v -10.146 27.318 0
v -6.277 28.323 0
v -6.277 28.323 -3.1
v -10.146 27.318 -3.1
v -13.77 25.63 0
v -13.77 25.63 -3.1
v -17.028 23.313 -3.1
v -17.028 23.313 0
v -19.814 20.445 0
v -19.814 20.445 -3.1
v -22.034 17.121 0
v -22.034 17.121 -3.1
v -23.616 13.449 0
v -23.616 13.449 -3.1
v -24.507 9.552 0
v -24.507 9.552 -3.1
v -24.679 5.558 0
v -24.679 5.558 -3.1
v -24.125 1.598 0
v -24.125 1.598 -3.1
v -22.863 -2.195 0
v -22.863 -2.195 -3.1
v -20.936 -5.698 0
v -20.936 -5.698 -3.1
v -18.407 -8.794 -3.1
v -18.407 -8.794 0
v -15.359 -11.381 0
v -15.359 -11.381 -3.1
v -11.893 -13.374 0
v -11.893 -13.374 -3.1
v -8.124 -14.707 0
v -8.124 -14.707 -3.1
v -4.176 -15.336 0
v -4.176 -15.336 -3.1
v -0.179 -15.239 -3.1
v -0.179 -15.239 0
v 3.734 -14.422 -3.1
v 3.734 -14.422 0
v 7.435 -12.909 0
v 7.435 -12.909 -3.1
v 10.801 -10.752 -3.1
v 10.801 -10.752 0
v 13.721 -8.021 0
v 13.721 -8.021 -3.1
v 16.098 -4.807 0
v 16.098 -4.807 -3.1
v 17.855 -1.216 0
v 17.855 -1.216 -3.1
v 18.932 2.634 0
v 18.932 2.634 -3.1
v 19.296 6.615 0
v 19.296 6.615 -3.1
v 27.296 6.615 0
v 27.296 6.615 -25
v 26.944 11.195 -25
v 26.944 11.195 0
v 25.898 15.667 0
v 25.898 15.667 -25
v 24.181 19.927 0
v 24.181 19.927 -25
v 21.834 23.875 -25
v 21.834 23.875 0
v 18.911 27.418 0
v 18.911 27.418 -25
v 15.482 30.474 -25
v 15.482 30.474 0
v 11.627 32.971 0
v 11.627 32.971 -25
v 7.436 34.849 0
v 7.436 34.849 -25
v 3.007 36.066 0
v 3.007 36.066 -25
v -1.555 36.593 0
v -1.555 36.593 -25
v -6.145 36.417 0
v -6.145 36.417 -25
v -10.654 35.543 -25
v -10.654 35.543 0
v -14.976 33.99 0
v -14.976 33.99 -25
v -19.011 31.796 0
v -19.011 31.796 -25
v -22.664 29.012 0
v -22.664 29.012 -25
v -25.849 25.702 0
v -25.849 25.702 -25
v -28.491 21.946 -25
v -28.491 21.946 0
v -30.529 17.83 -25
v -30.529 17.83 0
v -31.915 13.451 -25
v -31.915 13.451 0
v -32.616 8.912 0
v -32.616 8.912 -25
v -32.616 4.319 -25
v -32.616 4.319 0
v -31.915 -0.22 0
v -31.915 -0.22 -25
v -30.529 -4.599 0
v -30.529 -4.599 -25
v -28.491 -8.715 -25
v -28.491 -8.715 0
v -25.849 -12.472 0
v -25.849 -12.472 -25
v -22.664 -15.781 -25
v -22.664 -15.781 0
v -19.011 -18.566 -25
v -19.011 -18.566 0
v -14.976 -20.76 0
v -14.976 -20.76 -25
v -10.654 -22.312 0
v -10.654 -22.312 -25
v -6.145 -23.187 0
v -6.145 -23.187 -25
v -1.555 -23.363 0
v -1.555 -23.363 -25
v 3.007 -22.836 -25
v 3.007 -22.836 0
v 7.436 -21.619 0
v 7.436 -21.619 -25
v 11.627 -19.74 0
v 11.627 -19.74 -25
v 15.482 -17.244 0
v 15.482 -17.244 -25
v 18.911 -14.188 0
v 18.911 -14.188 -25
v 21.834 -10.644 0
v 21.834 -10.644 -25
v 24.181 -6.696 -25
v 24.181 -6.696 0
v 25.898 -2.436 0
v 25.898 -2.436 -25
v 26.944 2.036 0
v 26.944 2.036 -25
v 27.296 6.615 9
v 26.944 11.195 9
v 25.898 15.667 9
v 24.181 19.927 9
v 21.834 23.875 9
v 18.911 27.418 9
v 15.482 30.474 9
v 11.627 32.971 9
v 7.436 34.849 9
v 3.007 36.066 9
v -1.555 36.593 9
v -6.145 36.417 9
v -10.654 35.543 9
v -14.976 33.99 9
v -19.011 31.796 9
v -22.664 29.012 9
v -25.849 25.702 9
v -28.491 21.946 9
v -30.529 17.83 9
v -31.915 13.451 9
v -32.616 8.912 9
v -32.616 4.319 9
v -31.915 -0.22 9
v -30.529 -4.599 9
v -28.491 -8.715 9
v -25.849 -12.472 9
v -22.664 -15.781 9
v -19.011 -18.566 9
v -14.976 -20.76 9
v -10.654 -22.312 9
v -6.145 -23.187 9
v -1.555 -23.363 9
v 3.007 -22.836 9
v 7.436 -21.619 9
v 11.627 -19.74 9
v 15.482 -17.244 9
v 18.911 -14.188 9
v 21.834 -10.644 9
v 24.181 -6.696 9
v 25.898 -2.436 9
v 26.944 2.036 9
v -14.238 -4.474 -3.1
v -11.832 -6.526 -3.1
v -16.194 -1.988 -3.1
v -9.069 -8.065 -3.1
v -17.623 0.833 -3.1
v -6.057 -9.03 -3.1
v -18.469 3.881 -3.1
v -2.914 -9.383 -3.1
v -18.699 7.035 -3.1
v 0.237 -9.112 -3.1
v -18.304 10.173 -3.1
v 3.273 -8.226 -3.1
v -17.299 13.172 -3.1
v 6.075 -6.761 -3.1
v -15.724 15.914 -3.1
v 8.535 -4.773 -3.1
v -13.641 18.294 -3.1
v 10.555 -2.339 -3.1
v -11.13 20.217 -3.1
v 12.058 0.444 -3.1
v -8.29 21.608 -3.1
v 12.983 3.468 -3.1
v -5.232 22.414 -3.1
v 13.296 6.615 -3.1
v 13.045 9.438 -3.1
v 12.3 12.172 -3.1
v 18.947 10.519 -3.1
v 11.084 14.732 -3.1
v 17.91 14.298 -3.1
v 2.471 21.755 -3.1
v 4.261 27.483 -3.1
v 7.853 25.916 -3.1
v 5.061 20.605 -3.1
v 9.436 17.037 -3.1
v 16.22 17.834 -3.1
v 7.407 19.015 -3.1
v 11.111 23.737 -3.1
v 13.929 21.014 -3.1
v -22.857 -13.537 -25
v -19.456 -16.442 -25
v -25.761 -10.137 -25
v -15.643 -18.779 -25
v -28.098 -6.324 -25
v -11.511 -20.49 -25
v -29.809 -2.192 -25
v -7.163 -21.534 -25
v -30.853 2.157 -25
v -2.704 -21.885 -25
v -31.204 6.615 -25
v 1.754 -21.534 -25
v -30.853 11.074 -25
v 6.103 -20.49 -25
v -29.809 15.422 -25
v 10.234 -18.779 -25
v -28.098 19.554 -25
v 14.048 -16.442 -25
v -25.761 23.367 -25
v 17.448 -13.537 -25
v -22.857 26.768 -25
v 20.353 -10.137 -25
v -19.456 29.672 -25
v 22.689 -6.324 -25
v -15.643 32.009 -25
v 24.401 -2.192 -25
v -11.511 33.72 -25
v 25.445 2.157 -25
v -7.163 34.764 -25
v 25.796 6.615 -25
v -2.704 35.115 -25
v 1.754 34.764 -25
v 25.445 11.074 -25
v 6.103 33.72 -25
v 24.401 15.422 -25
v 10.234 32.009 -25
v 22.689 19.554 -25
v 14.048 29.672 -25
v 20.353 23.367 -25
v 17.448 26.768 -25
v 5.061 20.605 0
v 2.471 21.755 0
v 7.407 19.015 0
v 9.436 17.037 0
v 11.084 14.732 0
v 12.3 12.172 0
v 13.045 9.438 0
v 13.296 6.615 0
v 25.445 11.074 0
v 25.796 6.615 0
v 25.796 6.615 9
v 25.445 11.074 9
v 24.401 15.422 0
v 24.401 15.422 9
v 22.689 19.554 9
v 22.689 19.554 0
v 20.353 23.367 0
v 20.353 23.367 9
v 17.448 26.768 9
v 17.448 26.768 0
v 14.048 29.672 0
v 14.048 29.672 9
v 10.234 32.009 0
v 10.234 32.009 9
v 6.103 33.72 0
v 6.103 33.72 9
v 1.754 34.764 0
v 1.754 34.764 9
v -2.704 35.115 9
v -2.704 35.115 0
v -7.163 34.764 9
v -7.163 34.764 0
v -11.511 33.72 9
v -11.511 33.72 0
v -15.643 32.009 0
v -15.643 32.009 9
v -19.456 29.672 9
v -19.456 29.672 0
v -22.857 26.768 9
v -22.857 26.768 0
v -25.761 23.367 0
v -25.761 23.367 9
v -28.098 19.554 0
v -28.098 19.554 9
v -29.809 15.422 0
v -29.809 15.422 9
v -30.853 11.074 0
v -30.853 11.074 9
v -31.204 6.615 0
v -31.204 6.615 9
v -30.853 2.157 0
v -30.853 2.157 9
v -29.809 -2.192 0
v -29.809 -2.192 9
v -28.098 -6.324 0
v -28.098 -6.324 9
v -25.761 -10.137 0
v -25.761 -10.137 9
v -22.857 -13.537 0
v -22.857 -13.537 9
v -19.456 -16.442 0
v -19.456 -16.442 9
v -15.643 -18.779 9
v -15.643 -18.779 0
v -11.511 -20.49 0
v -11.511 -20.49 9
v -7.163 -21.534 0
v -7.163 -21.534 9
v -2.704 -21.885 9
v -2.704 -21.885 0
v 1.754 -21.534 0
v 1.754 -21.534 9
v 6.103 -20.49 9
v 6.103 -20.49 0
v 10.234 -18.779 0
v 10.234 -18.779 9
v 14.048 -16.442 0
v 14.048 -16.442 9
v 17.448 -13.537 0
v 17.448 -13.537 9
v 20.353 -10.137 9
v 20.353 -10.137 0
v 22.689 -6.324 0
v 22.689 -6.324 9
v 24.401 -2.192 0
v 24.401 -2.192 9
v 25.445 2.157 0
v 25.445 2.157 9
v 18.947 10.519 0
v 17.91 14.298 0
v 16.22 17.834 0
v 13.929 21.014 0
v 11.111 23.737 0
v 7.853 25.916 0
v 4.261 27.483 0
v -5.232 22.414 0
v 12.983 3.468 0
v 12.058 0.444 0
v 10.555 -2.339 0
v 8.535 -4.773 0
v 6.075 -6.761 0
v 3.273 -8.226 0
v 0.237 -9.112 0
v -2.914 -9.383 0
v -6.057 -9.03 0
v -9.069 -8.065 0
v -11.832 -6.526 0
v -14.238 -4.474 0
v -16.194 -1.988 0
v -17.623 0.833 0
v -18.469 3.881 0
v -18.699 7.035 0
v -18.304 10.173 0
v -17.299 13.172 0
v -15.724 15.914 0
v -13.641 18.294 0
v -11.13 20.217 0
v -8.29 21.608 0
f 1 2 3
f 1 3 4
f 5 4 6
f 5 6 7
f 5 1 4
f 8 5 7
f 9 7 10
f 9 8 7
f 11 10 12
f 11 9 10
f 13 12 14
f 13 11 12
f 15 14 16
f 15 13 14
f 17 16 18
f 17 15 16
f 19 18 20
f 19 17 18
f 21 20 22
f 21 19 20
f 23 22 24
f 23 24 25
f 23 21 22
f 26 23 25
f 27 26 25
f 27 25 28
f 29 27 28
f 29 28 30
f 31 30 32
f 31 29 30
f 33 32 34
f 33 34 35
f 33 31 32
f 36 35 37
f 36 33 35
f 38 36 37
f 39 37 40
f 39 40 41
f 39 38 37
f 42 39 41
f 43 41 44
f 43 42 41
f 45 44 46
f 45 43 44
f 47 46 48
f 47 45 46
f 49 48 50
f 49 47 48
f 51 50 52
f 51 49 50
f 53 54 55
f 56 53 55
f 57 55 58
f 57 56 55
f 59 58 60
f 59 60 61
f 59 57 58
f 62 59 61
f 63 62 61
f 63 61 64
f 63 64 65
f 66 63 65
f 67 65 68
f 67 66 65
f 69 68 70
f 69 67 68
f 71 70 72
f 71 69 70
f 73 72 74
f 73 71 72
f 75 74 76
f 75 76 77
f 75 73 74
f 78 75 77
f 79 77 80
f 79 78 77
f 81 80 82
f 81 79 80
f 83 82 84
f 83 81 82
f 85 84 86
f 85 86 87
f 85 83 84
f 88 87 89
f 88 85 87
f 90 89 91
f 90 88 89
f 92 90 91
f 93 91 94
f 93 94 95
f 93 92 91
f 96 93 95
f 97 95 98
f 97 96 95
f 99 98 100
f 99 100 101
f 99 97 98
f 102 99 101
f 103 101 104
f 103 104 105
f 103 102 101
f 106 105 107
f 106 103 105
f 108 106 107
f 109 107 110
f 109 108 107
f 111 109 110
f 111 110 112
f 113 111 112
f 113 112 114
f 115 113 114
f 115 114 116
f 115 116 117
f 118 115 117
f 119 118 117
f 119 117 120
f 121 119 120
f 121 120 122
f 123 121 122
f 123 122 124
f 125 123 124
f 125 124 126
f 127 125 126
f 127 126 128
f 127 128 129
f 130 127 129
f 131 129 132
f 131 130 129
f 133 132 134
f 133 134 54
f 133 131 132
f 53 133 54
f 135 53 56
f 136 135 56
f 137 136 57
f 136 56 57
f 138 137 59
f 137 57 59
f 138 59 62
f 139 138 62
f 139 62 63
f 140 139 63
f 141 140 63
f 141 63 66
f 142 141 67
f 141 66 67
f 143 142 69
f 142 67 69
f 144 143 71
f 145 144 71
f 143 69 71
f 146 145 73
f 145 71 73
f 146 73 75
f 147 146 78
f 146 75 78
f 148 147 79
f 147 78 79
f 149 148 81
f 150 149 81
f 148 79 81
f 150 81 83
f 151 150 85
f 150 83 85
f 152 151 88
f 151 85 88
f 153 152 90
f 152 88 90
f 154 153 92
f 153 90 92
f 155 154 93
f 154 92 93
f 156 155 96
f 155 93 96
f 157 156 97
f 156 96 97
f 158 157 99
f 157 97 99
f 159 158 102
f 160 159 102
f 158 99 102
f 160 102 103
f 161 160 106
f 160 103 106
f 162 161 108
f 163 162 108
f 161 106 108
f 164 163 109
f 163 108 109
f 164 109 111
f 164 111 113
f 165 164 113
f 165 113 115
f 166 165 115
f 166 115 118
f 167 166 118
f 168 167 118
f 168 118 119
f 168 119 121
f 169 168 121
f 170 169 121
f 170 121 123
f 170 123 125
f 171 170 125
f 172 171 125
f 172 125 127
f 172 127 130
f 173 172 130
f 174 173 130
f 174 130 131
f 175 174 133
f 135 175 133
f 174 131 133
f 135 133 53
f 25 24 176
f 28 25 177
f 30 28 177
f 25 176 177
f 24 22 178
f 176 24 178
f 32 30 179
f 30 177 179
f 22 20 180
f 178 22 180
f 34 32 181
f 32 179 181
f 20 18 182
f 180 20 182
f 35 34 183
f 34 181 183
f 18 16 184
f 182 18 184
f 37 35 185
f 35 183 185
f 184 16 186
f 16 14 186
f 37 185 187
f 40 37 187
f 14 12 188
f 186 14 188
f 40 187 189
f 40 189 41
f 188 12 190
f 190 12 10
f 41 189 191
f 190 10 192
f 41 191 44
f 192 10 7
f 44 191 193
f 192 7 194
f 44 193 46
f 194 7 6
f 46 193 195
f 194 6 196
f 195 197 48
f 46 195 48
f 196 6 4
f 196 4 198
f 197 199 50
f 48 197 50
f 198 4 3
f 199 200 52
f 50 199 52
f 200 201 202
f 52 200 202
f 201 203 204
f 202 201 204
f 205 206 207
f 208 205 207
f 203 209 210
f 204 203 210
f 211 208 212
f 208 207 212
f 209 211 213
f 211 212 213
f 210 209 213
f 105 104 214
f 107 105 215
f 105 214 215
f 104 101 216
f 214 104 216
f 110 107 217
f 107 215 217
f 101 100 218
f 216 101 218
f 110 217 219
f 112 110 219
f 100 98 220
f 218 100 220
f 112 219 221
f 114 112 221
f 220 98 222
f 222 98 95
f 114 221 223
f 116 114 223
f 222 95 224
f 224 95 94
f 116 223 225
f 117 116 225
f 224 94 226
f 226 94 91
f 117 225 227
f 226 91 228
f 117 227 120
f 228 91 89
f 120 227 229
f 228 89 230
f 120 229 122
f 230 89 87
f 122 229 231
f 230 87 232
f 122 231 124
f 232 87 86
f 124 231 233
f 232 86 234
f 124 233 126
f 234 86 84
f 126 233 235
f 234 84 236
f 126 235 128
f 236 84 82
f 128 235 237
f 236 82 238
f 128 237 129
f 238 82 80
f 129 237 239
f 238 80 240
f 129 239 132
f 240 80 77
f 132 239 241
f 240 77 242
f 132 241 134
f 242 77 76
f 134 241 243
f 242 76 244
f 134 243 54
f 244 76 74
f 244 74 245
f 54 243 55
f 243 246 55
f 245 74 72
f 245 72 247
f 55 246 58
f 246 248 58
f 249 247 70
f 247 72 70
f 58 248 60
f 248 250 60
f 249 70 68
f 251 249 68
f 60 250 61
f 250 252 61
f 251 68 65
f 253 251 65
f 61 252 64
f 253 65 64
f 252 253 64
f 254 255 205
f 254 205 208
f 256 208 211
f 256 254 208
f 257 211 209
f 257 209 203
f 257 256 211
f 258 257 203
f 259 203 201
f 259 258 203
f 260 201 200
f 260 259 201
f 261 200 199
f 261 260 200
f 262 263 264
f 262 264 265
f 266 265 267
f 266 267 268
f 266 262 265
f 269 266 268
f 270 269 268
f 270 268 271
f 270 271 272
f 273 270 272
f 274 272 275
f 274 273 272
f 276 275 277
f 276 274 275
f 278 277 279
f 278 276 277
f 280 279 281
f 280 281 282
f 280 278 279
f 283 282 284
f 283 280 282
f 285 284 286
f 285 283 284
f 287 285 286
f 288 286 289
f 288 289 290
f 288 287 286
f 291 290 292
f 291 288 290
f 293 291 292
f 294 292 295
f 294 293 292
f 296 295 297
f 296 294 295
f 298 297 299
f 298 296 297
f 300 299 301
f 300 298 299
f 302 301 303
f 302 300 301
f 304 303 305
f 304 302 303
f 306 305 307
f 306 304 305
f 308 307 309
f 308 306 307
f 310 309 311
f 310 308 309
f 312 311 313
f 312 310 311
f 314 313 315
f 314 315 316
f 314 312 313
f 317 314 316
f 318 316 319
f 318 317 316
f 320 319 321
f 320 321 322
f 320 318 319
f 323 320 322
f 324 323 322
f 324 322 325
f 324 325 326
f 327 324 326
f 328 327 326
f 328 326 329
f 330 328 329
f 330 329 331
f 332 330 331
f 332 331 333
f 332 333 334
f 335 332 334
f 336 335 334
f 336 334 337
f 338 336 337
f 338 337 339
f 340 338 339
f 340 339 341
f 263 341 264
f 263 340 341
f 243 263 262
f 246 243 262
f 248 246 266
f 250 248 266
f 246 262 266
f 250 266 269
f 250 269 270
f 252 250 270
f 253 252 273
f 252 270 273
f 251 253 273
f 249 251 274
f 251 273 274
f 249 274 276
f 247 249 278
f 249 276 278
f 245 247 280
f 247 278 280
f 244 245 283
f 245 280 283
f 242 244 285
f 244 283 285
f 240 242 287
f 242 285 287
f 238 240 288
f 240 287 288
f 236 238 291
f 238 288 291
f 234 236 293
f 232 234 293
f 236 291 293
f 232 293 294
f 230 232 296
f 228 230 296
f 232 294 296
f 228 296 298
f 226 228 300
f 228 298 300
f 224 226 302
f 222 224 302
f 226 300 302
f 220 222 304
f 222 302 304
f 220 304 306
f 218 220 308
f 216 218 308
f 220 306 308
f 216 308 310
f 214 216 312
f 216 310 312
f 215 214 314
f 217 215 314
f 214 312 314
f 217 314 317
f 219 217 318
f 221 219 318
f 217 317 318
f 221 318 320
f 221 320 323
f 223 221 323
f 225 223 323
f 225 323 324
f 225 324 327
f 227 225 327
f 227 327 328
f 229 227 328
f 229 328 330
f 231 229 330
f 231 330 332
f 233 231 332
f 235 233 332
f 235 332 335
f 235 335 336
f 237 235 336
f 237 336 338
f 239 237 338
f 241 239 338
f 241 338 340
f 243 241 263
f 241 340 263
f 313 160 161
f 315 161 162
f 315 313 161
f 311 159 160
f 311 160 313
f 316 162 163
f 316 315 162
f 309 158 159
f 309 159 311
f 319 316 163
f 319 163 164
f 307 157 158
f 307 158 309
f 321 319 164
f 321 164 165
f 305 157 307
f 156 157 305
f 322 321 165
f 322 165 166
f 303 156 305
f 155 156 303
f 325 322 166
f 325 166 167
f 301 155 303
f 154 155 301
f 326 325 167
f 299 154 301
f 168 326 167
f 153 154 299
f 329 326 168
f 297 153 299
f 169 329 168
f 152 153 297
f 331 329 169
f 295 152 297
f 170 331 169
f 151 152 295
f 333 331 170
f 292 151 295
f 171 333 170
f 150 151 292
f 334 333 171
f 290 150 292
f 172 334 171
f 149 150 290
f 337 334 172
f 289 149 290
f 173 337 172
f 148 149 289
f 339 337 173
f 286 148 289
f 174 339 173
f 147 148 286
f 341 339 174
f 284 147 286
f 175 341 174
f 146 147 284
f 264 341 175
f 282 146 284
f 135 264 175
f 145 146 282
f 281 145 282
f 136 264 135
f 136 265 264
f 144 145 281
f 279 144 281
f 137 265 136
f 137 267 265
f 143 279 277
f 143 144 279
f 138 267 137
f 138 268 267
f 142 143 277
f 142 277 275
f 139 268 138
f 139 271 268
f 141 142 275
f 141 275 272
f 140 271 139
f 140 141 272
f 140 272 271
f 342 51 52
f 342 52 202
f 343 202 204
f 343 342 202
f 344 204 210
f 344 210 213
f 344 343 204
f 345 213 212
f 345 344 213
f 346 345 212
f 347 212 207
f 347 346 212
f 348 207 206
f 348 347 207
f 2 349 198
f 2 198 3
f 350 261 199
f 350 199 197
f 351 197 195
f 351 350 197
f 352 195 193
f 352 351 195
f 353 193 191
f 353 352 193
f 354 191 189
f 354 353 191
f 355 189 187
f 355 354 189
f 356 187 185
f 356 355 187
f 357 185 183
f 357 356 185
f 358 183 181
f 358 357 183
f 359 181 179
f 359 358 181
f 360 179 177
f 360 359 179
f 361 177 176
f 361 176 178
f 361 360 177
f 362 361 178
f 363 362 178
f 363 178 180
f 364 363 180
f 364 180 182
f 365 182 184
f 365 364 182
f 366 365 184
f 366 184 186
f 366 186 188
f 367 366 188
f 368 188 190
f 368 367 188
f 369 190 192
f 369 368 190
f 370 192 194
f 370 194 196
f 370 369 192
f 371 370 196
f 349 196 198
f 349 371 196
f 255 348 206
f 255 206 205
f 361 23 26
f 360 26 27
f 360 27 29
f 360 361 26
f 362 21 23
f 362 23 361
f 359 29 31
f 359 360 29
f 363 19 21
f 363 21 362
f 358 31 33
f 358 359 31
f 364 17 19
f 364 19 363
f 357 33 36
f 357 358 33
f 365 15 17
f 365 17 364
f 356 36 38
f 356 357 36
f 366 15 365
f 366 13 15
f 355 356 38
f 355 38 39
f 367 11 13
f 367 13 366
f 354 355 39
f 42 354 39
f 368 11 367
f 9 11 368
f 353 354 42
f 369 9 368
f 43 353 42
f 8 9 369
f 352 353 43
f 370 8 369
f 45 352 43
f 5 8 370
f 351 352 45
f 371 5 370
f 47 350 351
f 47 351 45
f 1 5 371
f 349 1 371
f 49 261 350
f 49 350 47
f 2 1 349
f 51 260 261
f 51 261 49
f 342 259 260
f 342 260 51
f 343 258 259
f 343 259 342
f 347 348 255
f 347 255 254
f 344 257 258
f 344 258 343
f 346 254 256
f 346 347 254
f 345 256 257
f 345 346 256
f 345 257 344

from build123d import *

# Parameters (mm, degrees)
F0_R        = 30
F0_R_2      = 28.5
F1_DEPTH    = 25
F2_DEPTH    = 3.1
F1_FACE_R   = 30
F1_FACE_R_2 = 28.5
F3_DEPTH    = 9


with BuildPart() as f1:
    # F0 (on Top) → F1 (new body)
    with BuildSketch(Plane.XY):
        with Locations((-2.70428, 6.615141)):
            Circle(F0_R)
        with Locations((-2.70428, 6.615141)):
            Circle(F0_R_2, mode=Mode.SUBTRACT)
    extrude(amount=-F1_DEPTH)

    # F1_face (on face) → F3 (join)
    with BuildSketch(Plane(origin=(-2.70428, 6.615141, 0), x_dir=(1, 0, 0), z_dir=(0, 0, 1))):
        Circle(F1_FACE_R)
        Circle(F1_FACE_R_2, mode=Mode.SUBTRACT)
    extrude(amount=F3_DEPTH)


with BuildPart() as f2:
    # F0 (on Top) → F2 (new body)
    with BuildSketch(Plane.XY):
        with BuildLine():
            ThreePointArc((-6.276818, 28.323135), (-16.941628, -10.156797), (19.29572, 6.615141))
            ThreePointArc((19.29572, 6.615141), (15.145667, 19.475133), (4.26123, 27.483339))
            Line((4.26123, 27.483339), (2.470784, 21.755112))
            ThreePointArc((2.470784, 21.755112), (10.311115, 15.921026), (13.29572, 6.615141))
            ThreePointArc((13.29572, 6.615141), (-13.086032, -5.55939), (-5.231683, 22.414263))
            Line((-5.231683, 22.414263), (-6.276818, 28.323135))
        make_face()
    extrude(amount=-F2_DEPTH)


solid = Compound([f1.part, f2.part])
